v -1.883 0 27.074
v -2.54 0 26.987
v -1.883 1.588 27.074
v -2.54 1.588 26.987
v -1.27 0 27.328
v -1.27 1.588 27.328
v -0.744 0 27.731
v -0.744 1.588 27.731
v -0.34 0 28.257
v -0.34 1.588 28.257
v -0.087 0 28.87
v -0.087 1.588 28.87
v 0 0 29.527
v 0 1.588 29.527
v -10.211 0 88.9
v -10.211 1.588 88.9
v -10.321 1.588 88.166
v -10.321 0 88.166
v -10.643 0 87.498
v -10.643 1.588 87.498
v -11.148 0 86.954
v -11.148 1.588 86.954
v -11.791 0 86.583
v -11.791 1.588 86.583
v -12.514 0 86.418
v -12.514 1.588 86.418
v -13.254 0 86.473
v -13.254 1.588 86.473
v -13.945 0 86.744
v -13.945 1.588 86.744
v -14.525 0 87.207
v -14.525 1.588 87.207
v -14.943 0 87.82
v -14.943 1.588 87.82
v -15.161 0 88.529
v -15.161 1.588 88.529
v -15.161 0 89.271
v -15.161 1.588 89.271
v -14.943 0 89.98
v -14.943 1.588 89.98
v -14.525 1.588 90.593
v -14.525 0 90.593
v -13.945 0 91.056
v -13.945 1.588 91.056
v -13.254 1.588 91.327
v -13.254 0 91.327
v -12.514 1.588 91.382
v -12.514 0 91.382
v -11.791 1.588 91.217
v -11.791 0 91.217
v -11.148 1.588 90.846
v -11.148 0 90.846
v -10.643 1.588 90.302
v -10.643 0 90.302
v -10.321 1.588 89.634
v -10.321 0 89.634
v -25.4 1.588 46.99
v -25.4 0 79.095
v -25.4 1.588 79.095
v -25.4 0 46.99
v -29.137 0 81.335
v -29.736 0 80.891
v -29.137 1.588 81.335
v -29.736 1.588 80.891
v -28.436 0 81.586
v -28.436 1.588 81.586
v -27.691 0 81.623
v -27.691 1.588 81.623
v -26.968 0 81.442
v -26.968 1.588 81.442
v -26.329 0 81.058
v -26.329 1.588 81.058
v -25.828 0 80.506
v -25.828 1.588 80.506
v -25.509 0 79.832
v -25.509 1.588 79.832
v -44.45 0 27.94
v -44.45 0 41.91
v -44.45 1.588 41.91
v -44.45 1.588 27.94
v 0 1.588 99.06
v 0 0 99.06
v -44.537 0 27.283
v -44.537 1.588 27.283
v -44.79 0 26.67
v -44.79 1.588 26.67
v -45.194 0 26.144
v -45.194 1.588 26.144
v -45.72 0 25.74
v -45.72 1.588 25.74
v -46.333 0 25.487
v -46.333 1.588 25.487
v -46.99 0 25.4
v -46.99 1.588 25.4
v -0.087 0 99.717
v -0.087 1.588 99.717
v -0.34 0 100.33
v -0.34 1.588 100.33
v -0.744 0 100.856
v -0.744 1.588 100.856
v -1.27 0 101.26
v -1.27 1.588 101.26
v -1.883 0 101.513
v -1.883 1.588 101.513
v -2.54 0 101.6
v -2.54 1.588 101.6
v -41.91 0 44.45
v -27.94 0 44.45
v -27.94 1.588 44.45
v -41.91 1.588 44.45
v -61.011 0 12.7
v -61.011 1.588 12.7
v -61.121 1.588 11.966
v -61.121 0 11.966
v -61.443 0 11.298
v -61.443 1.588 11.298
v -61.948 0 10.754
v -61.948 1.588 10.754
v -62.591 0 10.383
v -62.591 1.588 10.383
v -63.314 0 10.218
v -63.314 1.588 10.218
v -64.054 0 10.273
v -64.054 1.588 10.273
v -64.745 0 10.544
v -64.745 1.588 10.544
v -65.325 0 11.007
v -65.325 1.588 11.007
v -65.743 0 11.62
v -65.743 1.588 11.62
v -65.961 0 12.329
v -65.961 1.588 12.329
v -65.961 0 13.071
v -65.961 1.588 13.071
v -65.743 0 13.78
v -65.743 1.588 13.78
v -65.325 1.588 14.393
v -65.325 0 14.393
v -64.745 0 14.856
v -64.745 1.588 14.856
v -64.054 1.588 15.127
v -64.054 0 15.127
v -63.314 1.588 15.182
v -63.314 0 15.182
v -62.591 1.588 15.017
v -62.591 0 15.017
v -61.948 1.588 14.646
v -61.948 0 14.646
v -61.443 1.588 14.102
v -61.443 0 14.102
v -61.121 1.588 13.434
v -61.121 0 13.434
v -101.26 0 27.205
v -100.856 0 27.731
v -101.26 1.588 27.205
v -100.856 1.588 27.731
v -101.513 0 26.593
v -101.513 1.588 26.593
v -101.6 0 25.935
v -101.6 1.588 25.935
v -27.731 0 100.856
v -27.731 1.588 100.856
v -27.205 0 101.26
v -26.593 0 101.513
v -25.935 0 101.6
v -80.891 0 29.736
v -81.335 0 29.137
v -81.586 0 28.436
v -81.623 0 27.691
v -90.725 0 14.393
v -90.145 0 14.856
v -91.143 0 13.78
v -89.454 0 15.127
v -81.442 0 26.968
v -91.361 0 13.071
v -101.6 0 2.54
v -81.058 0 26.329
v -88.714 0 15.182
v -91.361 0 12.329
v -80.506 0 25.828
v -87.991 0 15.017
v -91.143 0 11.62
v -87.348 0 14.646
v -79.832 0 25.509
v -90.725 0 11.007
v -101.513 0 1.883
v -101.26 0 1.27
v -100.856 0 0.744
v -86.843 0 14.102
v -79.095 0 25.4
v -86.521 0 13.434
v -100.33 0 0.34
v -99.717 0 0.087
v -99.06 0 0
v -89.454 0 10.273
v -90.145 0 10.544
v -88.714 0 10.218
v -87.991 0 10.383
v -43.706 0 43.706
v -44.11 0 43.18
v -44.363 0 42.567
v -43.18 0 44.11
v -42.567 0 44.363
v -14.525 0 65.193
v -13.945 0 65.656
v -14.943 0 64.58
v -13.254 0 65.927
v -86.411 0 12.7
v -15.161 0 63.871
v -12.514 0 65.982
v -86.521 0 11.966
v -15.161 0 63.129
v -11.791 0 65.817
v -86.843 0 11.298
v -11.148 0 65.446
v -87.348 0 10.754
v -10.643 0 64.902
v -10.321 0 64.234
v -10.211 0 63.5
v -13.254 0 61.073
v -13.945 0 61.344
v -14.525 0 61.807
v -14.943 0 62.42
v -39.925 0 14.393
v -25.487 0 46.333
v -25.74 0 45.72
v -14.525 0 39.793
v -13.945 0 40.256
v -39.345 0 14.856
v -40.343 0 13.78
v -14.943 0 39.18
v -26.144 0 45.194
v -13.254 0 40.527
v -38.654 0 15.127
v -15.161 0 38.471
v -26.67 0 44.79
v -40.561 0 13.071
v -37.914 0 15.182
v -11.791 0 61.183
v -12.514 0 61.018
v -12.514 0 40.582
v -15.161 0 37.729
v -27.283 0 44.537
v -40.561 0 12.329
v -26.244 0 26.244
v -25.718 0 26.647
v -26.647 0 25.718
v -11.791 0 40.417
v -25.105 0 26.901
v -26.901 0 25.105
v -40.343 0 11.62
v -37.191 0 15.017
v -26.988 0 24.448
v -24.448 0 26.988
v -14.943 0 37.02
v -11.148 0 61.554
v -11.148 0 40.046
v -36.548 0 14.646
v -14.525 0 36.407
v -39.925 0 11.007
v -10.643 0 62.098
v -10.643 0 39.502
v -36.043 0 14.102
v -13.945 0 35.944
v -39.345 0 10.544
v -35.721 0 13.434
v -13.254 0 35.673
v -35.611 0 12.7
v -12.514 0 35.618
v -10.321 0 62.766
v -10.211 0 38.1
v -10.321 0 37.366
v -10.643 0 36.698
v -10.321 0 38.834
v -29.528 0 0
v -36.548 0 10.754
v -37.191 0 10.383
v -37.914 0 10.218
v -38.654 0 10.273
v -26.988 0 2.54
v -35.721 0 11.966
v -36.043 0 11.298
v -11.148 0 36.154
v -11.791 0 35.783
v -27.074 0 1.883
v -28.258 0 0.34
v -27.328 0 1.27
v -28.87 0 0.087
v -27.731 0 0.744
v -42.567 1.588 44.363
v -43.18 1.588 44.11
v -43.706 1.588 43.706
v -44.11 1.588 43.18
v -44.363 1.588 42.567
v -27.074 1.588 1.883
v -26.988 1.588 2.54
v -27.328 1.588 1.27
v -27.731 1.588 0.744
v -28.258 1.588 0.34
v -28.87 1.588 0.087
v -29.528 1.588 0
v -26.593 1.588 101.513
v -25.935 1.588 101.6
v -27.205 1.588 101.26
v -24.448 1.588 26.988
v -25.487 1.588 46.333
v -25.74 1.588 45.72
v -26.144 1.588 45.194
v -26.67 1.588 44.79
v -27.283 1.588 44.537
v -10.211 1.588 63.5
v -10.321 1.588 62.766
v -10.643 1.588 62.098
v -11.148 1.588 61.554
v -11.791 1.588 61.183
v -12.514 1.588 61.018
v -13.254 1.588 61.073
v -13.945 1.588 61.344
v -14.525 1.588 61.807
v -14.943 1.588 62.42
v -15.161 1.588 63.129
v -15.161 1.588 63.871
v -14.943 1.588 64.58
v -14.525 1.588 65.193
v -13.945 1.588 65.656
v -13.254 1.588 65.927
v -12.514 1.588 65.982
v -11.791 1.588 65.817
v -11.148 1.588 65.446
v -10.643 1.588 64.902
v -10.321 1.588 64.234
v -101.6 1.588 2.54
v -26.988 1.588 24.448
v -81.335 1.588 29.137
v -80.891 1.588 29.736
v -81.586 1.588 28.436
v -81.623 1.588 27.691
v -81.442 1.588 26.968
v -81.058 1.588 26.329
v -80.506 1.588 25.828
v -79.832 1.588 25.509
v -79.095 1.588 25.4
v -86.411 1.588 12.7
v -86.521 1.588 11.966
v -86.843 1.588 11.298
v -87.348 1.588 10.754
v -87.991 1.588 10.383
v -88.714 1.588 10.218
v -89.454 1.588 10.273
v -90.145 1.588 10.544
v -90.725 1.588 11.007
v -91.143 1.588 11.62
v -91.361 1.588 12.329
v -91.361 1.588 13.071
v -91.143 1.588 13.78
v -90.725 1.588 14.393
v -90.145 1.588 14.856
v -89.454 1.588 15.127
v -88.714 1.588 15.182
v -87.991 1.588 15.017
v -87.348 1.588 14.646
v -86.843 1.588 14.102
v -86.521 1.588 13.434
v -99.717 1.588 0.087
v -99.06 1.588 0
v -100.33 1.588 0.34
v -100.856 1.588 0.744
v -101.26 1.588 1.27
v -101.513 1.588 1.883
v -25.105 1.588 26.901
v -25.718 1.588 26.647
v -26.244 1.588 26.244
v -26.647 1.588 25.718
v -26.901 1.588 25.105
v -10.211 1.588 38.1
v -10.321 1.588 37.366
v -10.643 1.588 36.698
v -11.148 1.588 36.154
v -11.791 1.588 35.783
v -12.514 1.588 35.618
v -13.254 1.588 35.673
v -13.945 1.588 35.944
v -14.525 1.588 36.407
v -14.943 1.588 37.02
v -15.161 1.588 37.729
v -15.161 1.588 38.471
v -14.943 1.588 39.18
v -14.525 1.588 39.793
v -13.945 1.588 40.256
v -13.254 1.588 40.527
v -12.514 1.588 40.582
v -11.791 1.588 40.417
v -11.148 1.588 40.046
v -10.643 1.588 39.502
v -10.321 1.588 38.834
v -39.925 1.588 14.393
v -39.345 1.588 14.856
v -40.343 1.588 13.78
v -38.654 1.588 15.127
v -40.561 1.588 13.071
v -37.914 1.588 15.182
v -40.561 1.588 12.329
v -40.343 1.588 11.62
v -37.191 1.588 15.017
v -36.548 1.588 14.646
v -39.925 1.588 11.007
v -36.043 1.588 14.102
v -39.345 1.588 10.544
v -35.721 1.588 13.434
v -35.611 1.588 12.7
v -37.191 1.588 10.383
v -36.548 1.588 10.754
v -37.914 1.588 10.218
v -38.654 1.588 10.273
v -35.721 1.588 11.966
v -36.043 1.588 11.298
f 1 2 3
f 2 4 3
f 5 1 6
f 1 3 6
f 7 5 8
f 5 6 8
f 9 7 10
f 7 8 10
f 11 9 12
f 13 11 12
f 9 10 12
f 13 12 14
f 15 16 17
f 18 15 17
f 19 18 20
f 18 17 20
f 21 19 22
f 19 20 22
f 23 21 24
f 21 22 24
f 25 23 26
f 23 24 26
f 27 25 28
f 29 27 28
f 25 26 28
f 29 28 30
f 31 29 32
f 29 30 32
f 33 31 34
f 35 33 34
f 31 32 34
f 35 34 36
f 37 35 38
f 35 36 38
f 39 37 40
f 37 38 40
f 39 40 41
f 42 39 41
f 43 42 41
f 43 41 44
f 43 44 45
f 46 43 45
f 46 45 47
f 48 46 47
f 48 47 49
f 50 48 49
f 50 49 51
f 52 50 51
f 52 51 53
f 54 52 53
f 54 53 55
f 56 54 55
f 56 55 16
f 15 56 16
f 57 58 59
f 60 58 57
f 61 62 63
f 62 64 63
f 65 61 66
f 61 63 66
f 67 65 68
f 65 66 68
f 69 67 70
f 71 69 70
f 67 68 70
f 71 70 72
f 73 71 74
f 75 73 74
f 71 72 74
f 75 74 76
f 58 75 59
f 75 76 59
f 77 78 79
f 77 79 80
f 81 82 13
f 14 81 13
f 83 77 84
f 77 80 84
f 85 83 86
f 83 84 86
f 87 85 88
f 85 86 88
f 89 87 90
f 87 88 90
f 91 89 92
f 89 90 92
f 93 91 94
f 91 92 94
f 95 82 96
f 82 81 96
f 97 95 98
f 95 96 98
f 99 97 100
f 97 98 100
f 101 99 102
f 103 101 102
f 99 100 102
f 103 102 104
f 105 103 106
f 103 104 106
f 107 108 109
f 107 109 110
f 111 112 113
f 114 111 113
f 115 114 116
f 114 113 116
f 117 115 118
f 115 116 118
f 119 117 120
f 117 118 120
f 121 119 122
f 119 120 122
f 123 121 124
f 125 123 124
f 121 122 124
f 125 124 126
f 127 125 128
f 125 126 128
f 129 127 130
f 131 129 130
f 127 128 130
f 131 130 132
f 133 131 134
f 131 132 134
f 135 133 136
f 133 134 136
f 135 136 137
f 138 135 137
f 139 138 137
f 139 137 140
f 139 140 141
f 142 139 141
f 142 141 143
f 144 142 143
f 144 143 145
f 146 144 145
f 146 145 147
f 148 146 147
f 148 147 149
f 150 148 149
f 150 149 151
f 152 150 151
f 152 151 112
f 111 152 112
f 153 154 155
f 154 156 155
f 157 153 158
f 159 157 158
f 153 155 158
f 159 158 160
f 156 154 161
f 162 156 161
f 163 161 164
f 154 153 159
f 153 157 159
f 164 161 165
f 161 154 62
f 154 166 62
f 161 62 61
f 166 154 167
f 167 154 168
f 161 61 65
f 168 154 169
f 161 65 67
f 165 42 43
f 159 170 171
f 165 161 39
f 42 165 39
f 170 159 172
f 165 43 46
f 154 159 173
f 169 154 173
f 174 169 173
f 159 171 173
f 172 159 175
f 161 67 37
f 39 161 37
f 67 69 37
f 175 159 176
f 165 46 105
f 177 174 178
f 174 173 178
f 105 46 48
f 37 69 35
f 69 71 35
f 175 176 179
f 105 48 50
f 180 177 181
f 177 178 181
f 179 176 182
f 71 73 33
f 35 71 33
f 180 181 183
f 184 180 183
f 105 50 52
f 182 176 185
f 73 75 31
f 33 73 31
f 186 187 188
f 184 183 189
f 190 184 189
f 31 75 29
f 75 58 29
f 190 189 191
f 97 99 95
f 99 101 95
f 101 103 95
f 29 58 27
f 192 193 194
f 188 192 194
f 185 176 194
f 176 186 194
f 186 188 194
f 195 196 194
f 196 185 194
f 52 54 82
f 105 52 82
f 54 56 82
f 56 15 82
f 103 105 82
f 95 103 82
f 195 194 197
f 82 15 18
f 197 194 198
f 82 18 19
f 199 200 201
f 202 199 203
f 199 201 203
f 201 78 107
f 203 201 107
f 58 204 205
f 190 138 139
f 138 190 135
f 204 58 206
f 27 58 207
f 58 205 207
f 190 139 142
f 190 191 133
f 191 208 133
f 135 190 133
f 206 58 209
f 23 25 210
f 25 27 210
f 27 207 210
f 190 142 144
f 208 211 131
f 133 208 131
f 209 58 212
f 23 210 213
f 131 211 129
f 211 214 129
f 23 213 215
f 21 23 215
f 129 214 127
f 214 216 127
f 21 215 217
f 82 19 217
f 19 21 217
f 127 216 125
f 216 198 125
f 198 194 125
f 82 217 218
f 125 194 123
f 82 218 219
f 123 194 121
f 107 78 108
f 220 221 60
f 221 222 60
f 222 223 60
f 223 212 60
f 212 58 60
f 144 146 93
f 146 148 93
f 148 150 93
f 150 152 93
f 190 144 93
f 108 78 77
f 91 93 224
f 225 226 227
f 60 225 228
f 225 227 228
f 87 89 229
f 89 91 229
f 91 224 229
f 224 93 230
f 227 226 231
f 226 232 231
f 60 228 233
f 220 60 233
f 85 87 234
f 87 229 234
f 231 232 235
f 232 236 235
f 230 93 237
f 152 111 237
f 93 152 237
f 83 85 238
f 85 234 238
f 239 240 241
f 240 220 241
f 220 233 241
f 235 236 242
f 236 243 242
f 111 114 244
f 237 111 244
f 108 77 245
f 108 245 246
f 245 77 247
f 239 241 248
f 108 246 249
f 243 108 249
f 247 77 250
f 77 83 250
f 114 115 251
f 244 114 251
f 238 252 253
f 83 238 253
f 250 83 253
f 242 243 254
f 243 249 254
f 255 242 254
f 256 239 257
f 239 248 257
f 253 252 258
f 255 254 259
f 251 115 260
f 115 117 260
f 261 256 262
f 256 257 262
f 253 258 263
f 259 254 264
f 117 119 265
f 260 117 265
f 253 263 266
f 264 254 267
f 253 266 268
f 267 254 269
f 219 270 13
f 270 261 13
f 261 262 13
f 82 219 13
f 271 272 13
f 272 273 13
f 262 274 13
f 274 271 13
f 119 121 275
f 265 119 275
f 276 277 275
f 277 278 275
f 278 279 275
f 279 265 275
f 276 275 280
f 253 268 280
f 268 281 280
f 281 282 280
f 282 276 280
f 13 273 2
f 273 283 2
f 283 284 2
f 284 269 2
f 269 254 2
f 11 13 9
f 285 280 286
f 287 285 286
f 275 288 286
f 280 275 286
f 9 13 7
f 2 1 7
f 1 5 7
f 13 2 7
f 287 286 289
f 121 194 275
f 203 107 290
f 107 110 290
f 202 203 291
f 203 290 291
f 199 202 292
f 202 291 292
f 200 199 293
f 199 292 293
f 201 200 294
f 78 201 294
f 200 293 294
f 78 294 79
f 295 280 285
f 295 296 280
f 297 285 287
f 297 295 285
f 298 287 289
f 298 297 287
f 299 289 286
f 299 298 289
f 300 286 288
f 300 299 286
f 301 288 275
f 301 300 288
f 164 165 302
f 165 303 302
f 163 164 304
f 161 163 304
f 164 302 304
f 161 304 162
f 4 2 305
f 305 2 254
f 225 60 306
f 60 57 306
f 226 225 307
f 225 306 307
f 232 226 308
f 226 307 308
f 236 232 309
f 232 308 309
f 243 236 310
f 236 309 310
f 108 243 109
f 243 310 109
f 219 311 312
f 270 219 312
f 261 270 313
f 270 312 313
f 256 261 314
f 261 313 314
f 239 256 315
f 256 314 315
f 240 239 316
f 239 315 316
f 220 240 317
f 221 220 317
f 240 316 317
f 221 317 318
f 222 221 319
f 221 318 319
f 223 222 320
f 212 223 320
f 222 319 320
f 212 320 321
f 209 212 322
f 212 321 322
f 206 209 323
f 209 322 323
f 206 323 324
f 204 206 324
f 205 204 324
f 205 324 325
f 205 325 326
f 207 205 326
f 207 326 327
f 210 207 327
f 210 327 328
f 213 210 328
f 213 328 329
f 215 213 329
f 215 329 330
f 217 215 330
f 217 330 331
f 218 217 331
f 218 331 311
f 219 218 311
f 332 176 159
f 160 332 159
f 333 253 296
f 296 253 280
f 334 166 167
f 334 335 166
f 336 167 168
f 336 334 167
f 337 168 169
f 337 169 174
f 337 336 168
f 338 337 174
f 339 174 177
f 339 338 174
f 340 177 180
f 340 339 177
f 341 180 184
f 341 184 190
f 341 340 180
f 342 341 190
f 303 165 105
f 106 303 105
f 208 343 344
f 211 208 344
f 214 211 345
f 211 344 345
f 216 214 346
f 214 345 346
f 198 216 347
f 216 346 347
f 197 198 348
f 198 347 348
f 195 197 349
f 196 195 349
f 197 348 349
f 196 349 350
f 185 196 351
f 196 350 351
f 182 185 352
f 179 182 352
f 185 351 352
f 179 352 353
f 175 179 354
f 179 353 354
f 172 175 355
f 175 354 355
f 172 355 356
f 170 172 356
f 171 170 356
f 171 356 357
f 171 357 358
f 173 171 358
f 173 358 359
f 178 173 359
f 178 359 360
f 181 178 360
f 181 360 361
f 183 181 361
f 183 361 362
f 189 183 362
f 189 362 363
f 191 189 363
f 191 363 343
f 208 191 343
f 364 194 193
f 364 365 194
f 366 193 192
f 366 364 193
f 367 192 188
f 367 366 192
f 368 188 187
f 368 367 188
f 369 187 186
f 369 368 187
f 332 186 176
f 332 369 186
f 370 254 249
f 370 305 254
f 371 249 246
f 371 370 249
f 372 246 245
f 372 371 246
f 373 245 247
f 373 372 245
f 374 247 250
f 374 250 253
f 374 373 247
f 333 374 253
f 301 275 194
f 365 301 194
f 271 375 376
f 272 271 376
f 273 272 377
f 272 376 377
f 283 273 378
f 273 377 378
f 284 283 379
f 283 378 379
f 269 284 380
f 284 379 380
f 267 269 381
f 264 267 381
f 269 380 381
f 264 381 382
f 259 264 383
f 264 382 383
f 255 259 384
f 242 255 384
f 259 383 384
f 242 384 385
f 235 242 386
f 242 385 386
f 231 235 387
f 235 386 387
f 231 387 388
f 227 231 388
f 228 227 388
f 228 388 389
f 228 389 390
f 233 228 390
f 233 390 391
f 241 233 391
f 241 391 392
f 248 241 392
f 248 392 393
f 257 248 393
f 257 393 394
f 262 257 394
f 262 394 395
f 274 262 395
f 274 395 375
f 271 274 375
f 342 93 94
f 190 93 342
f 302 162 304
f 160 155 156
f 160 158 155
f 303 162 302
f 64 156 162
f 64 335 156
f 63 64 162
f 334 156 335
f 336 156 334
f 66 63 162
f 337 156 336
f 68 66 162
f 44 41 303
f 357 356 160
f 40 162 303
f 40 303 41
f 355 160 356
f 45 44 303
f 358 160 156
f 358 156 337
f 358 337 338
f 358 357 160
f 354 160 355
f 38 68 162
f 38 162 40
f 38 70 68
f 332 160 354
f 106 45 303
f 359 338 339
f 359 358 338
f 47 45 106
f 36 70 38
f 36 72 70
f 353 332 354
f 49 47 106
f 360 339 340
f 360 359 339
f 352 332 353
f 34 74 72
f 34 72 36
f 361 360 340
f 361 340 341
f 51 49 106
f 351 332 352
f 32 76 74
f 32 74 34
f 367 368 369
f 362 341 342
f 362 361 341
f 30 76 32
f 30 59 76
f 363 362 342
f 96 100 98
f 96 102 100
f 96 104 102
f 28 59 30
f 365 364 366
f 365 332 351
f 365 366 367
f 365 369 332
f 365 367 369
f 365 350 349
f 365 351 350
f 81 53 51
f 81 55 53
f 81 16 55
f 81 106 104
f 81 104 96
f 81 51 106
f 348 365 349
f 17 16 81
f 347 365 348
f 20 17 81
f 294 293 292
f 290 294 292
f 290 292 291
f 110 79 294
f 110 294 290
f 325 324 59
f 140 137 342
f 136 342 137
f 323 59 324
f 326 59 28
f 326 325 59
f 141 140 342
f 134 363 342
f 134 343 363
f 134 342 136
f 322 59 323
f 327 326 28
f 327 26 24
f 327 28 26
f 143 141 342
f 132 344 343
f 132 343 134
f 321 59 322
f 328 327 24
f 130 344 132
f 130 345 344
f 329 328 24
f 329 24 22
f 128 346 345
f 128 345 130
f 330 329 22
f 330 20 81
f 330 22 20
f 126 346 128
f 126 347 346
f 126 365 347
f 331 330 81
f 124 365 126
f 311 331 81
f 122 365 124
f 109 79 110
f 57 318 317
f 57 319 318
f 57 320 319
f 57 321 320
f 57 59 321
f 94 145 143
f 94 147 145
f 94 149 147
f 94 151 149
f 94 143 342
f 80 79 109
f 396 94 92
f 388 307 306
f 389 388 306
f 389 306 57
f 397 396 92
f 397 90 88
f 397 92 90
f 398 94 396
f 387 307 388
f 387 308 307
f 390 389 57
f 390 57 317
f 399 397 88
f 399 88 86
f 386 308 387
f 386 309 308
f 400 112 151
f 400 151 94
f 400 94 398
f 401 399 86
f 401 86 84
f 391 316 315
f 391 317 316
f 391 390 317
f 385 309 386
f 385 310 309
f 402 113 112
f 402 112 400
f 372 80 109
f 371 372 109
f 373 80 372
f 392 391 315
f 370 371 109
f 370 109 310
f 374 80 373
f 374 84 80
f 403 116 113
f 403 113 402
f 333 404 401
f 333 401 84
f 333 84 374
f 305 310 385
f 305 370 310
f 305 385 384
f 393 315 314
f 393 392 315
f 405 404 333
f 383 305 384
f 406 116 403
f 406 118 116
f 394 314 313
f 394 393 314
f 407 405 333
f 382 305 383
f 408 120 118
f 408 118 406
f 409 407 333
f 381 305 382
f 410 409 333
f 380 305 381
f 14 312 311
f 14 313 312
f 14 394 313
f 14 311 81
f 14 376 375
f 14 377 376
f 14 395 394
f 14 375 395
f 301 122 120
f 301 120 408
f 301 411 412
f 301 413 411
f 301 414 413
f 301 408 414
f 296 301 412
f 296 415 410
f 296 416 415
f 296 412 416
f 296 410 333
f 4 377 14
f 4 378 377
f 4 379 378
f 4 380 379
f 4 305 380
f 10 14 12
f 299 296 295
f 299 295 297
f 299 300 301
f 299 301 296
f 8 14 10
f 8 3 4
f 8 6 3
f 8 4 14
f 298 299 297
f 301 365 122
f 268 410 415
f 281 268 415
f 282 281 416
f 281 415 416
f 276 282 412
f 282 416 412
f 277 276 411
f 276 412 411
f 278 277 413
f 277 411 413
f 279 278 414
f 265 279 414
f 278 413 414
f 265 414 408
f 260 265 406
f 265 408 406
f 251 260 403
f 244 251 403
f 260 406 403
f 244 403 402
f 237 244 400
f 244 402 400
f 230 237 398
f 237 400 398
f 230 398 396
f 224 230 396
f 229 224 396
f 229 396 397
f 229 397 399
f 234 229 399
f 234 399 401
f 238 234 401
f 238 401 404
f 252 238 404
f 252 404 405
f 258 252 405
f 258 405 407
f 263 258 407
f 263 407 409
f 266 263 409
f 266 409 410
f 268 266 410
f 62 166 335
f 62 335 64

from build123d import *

# Parameters (mm, degrees)
BOSS_EXTRUDE1_DEPTH = 1.5875
FILLET1_R           = 2.54
SKETCH2_R           = 2.4892
CUT_EXTRUDE1_DEPTH  = 2.5875
LPATTERN1_COUNT     = 3
LPATTERN1_PITCH     = 25.4
LPATTERN2_COUNT     = 3
LPATTERN2_PITCH     = 25.4


with BuildPart() as part:
    # Sketch1 → Boss-Extrude1 (new body)
    with BuildSketch(Plane(origin=(0, 0, 0), x_dir=(1, 0, 0), z_dir=(0, 1, 0))):
        Polygon((0, -26.9875), (-26.9875, -26.9875), (-26.9875, 0), (-101.6, 0), (-101.6, -26.9875), (-26.9875, -101.6), (0, -101.6), align=None)
        Polygon((-85.226987758, -25.4), (-25.4, -85.226987758), (-25.4, -44.45), (-44.45, -44.45), (-44.45, -25.4), align=None, mode=Mode.SUBTRACT)
    extrude(amount=BOSS_EXTRUDE1_DEPTH)

    # Fillet1
    fillet1_edges = [part.edges().sort_by_distance(p)[0] for p in [
        (-26.9875, 0.79375, 26.9875),
        (0, 0.79375, 26.9875),
        (0, 0.79375, 101.6),
        (-26.9875, 0.79375, 101.6),
        (-101.6, 0.79375, 26.9875),
        (-101.6, 0.79375, 0),
        (-26.9875, 0.79375, 0),
        (-44.45, 0.79375, 25.4),
        (-85.226987758, 0.79375, 25.4),
        (-25.4, 0.79375, 85.226987758),
        (-25.4, 0.79375, 44.45),
        (-44.45, 0.79375, 44.45),
    ]]
    fillet(fillet1_edges, radius=FILLET1_R)

    # Sketch2 → Cut-Extrude1 (cut, through all)
    with BuildSketch(Plane(origin=(0, 1.5875, 0), x_dir=(1, 0, 0), z_dir=(0, 1, 0))):
        with Locations((-88.9, -12.7)):
            Circle(SKETCH2_R)
        with Locations((-12.7, -88.9)):
            Circle(SKETCH2_R)
    cut_extrude1 = extrude(amount=-CUT_EXTRUDE1_DEPTH, mode=Mode.SUBTRACT)

    # LPattern1: Cut-Extrude1 ×3
    with Locations(*[(i * LPATTERN1_PITCH, 0, 0) for i in range(1, LPATTERN1_COUNT)]):
        add(cut_extrude1, mode=Mode.SUBTRACT)

    # LPattern2: Cut-Extrude1 ×3
    with Locations(*[(0, 0, -i * LPATTERN2_PITCH) for i in range(1, LPATTERN2_COUNT)]):
        add(cut_extrude1, mode=Mode.SUBTRACT)


solid = part.part
